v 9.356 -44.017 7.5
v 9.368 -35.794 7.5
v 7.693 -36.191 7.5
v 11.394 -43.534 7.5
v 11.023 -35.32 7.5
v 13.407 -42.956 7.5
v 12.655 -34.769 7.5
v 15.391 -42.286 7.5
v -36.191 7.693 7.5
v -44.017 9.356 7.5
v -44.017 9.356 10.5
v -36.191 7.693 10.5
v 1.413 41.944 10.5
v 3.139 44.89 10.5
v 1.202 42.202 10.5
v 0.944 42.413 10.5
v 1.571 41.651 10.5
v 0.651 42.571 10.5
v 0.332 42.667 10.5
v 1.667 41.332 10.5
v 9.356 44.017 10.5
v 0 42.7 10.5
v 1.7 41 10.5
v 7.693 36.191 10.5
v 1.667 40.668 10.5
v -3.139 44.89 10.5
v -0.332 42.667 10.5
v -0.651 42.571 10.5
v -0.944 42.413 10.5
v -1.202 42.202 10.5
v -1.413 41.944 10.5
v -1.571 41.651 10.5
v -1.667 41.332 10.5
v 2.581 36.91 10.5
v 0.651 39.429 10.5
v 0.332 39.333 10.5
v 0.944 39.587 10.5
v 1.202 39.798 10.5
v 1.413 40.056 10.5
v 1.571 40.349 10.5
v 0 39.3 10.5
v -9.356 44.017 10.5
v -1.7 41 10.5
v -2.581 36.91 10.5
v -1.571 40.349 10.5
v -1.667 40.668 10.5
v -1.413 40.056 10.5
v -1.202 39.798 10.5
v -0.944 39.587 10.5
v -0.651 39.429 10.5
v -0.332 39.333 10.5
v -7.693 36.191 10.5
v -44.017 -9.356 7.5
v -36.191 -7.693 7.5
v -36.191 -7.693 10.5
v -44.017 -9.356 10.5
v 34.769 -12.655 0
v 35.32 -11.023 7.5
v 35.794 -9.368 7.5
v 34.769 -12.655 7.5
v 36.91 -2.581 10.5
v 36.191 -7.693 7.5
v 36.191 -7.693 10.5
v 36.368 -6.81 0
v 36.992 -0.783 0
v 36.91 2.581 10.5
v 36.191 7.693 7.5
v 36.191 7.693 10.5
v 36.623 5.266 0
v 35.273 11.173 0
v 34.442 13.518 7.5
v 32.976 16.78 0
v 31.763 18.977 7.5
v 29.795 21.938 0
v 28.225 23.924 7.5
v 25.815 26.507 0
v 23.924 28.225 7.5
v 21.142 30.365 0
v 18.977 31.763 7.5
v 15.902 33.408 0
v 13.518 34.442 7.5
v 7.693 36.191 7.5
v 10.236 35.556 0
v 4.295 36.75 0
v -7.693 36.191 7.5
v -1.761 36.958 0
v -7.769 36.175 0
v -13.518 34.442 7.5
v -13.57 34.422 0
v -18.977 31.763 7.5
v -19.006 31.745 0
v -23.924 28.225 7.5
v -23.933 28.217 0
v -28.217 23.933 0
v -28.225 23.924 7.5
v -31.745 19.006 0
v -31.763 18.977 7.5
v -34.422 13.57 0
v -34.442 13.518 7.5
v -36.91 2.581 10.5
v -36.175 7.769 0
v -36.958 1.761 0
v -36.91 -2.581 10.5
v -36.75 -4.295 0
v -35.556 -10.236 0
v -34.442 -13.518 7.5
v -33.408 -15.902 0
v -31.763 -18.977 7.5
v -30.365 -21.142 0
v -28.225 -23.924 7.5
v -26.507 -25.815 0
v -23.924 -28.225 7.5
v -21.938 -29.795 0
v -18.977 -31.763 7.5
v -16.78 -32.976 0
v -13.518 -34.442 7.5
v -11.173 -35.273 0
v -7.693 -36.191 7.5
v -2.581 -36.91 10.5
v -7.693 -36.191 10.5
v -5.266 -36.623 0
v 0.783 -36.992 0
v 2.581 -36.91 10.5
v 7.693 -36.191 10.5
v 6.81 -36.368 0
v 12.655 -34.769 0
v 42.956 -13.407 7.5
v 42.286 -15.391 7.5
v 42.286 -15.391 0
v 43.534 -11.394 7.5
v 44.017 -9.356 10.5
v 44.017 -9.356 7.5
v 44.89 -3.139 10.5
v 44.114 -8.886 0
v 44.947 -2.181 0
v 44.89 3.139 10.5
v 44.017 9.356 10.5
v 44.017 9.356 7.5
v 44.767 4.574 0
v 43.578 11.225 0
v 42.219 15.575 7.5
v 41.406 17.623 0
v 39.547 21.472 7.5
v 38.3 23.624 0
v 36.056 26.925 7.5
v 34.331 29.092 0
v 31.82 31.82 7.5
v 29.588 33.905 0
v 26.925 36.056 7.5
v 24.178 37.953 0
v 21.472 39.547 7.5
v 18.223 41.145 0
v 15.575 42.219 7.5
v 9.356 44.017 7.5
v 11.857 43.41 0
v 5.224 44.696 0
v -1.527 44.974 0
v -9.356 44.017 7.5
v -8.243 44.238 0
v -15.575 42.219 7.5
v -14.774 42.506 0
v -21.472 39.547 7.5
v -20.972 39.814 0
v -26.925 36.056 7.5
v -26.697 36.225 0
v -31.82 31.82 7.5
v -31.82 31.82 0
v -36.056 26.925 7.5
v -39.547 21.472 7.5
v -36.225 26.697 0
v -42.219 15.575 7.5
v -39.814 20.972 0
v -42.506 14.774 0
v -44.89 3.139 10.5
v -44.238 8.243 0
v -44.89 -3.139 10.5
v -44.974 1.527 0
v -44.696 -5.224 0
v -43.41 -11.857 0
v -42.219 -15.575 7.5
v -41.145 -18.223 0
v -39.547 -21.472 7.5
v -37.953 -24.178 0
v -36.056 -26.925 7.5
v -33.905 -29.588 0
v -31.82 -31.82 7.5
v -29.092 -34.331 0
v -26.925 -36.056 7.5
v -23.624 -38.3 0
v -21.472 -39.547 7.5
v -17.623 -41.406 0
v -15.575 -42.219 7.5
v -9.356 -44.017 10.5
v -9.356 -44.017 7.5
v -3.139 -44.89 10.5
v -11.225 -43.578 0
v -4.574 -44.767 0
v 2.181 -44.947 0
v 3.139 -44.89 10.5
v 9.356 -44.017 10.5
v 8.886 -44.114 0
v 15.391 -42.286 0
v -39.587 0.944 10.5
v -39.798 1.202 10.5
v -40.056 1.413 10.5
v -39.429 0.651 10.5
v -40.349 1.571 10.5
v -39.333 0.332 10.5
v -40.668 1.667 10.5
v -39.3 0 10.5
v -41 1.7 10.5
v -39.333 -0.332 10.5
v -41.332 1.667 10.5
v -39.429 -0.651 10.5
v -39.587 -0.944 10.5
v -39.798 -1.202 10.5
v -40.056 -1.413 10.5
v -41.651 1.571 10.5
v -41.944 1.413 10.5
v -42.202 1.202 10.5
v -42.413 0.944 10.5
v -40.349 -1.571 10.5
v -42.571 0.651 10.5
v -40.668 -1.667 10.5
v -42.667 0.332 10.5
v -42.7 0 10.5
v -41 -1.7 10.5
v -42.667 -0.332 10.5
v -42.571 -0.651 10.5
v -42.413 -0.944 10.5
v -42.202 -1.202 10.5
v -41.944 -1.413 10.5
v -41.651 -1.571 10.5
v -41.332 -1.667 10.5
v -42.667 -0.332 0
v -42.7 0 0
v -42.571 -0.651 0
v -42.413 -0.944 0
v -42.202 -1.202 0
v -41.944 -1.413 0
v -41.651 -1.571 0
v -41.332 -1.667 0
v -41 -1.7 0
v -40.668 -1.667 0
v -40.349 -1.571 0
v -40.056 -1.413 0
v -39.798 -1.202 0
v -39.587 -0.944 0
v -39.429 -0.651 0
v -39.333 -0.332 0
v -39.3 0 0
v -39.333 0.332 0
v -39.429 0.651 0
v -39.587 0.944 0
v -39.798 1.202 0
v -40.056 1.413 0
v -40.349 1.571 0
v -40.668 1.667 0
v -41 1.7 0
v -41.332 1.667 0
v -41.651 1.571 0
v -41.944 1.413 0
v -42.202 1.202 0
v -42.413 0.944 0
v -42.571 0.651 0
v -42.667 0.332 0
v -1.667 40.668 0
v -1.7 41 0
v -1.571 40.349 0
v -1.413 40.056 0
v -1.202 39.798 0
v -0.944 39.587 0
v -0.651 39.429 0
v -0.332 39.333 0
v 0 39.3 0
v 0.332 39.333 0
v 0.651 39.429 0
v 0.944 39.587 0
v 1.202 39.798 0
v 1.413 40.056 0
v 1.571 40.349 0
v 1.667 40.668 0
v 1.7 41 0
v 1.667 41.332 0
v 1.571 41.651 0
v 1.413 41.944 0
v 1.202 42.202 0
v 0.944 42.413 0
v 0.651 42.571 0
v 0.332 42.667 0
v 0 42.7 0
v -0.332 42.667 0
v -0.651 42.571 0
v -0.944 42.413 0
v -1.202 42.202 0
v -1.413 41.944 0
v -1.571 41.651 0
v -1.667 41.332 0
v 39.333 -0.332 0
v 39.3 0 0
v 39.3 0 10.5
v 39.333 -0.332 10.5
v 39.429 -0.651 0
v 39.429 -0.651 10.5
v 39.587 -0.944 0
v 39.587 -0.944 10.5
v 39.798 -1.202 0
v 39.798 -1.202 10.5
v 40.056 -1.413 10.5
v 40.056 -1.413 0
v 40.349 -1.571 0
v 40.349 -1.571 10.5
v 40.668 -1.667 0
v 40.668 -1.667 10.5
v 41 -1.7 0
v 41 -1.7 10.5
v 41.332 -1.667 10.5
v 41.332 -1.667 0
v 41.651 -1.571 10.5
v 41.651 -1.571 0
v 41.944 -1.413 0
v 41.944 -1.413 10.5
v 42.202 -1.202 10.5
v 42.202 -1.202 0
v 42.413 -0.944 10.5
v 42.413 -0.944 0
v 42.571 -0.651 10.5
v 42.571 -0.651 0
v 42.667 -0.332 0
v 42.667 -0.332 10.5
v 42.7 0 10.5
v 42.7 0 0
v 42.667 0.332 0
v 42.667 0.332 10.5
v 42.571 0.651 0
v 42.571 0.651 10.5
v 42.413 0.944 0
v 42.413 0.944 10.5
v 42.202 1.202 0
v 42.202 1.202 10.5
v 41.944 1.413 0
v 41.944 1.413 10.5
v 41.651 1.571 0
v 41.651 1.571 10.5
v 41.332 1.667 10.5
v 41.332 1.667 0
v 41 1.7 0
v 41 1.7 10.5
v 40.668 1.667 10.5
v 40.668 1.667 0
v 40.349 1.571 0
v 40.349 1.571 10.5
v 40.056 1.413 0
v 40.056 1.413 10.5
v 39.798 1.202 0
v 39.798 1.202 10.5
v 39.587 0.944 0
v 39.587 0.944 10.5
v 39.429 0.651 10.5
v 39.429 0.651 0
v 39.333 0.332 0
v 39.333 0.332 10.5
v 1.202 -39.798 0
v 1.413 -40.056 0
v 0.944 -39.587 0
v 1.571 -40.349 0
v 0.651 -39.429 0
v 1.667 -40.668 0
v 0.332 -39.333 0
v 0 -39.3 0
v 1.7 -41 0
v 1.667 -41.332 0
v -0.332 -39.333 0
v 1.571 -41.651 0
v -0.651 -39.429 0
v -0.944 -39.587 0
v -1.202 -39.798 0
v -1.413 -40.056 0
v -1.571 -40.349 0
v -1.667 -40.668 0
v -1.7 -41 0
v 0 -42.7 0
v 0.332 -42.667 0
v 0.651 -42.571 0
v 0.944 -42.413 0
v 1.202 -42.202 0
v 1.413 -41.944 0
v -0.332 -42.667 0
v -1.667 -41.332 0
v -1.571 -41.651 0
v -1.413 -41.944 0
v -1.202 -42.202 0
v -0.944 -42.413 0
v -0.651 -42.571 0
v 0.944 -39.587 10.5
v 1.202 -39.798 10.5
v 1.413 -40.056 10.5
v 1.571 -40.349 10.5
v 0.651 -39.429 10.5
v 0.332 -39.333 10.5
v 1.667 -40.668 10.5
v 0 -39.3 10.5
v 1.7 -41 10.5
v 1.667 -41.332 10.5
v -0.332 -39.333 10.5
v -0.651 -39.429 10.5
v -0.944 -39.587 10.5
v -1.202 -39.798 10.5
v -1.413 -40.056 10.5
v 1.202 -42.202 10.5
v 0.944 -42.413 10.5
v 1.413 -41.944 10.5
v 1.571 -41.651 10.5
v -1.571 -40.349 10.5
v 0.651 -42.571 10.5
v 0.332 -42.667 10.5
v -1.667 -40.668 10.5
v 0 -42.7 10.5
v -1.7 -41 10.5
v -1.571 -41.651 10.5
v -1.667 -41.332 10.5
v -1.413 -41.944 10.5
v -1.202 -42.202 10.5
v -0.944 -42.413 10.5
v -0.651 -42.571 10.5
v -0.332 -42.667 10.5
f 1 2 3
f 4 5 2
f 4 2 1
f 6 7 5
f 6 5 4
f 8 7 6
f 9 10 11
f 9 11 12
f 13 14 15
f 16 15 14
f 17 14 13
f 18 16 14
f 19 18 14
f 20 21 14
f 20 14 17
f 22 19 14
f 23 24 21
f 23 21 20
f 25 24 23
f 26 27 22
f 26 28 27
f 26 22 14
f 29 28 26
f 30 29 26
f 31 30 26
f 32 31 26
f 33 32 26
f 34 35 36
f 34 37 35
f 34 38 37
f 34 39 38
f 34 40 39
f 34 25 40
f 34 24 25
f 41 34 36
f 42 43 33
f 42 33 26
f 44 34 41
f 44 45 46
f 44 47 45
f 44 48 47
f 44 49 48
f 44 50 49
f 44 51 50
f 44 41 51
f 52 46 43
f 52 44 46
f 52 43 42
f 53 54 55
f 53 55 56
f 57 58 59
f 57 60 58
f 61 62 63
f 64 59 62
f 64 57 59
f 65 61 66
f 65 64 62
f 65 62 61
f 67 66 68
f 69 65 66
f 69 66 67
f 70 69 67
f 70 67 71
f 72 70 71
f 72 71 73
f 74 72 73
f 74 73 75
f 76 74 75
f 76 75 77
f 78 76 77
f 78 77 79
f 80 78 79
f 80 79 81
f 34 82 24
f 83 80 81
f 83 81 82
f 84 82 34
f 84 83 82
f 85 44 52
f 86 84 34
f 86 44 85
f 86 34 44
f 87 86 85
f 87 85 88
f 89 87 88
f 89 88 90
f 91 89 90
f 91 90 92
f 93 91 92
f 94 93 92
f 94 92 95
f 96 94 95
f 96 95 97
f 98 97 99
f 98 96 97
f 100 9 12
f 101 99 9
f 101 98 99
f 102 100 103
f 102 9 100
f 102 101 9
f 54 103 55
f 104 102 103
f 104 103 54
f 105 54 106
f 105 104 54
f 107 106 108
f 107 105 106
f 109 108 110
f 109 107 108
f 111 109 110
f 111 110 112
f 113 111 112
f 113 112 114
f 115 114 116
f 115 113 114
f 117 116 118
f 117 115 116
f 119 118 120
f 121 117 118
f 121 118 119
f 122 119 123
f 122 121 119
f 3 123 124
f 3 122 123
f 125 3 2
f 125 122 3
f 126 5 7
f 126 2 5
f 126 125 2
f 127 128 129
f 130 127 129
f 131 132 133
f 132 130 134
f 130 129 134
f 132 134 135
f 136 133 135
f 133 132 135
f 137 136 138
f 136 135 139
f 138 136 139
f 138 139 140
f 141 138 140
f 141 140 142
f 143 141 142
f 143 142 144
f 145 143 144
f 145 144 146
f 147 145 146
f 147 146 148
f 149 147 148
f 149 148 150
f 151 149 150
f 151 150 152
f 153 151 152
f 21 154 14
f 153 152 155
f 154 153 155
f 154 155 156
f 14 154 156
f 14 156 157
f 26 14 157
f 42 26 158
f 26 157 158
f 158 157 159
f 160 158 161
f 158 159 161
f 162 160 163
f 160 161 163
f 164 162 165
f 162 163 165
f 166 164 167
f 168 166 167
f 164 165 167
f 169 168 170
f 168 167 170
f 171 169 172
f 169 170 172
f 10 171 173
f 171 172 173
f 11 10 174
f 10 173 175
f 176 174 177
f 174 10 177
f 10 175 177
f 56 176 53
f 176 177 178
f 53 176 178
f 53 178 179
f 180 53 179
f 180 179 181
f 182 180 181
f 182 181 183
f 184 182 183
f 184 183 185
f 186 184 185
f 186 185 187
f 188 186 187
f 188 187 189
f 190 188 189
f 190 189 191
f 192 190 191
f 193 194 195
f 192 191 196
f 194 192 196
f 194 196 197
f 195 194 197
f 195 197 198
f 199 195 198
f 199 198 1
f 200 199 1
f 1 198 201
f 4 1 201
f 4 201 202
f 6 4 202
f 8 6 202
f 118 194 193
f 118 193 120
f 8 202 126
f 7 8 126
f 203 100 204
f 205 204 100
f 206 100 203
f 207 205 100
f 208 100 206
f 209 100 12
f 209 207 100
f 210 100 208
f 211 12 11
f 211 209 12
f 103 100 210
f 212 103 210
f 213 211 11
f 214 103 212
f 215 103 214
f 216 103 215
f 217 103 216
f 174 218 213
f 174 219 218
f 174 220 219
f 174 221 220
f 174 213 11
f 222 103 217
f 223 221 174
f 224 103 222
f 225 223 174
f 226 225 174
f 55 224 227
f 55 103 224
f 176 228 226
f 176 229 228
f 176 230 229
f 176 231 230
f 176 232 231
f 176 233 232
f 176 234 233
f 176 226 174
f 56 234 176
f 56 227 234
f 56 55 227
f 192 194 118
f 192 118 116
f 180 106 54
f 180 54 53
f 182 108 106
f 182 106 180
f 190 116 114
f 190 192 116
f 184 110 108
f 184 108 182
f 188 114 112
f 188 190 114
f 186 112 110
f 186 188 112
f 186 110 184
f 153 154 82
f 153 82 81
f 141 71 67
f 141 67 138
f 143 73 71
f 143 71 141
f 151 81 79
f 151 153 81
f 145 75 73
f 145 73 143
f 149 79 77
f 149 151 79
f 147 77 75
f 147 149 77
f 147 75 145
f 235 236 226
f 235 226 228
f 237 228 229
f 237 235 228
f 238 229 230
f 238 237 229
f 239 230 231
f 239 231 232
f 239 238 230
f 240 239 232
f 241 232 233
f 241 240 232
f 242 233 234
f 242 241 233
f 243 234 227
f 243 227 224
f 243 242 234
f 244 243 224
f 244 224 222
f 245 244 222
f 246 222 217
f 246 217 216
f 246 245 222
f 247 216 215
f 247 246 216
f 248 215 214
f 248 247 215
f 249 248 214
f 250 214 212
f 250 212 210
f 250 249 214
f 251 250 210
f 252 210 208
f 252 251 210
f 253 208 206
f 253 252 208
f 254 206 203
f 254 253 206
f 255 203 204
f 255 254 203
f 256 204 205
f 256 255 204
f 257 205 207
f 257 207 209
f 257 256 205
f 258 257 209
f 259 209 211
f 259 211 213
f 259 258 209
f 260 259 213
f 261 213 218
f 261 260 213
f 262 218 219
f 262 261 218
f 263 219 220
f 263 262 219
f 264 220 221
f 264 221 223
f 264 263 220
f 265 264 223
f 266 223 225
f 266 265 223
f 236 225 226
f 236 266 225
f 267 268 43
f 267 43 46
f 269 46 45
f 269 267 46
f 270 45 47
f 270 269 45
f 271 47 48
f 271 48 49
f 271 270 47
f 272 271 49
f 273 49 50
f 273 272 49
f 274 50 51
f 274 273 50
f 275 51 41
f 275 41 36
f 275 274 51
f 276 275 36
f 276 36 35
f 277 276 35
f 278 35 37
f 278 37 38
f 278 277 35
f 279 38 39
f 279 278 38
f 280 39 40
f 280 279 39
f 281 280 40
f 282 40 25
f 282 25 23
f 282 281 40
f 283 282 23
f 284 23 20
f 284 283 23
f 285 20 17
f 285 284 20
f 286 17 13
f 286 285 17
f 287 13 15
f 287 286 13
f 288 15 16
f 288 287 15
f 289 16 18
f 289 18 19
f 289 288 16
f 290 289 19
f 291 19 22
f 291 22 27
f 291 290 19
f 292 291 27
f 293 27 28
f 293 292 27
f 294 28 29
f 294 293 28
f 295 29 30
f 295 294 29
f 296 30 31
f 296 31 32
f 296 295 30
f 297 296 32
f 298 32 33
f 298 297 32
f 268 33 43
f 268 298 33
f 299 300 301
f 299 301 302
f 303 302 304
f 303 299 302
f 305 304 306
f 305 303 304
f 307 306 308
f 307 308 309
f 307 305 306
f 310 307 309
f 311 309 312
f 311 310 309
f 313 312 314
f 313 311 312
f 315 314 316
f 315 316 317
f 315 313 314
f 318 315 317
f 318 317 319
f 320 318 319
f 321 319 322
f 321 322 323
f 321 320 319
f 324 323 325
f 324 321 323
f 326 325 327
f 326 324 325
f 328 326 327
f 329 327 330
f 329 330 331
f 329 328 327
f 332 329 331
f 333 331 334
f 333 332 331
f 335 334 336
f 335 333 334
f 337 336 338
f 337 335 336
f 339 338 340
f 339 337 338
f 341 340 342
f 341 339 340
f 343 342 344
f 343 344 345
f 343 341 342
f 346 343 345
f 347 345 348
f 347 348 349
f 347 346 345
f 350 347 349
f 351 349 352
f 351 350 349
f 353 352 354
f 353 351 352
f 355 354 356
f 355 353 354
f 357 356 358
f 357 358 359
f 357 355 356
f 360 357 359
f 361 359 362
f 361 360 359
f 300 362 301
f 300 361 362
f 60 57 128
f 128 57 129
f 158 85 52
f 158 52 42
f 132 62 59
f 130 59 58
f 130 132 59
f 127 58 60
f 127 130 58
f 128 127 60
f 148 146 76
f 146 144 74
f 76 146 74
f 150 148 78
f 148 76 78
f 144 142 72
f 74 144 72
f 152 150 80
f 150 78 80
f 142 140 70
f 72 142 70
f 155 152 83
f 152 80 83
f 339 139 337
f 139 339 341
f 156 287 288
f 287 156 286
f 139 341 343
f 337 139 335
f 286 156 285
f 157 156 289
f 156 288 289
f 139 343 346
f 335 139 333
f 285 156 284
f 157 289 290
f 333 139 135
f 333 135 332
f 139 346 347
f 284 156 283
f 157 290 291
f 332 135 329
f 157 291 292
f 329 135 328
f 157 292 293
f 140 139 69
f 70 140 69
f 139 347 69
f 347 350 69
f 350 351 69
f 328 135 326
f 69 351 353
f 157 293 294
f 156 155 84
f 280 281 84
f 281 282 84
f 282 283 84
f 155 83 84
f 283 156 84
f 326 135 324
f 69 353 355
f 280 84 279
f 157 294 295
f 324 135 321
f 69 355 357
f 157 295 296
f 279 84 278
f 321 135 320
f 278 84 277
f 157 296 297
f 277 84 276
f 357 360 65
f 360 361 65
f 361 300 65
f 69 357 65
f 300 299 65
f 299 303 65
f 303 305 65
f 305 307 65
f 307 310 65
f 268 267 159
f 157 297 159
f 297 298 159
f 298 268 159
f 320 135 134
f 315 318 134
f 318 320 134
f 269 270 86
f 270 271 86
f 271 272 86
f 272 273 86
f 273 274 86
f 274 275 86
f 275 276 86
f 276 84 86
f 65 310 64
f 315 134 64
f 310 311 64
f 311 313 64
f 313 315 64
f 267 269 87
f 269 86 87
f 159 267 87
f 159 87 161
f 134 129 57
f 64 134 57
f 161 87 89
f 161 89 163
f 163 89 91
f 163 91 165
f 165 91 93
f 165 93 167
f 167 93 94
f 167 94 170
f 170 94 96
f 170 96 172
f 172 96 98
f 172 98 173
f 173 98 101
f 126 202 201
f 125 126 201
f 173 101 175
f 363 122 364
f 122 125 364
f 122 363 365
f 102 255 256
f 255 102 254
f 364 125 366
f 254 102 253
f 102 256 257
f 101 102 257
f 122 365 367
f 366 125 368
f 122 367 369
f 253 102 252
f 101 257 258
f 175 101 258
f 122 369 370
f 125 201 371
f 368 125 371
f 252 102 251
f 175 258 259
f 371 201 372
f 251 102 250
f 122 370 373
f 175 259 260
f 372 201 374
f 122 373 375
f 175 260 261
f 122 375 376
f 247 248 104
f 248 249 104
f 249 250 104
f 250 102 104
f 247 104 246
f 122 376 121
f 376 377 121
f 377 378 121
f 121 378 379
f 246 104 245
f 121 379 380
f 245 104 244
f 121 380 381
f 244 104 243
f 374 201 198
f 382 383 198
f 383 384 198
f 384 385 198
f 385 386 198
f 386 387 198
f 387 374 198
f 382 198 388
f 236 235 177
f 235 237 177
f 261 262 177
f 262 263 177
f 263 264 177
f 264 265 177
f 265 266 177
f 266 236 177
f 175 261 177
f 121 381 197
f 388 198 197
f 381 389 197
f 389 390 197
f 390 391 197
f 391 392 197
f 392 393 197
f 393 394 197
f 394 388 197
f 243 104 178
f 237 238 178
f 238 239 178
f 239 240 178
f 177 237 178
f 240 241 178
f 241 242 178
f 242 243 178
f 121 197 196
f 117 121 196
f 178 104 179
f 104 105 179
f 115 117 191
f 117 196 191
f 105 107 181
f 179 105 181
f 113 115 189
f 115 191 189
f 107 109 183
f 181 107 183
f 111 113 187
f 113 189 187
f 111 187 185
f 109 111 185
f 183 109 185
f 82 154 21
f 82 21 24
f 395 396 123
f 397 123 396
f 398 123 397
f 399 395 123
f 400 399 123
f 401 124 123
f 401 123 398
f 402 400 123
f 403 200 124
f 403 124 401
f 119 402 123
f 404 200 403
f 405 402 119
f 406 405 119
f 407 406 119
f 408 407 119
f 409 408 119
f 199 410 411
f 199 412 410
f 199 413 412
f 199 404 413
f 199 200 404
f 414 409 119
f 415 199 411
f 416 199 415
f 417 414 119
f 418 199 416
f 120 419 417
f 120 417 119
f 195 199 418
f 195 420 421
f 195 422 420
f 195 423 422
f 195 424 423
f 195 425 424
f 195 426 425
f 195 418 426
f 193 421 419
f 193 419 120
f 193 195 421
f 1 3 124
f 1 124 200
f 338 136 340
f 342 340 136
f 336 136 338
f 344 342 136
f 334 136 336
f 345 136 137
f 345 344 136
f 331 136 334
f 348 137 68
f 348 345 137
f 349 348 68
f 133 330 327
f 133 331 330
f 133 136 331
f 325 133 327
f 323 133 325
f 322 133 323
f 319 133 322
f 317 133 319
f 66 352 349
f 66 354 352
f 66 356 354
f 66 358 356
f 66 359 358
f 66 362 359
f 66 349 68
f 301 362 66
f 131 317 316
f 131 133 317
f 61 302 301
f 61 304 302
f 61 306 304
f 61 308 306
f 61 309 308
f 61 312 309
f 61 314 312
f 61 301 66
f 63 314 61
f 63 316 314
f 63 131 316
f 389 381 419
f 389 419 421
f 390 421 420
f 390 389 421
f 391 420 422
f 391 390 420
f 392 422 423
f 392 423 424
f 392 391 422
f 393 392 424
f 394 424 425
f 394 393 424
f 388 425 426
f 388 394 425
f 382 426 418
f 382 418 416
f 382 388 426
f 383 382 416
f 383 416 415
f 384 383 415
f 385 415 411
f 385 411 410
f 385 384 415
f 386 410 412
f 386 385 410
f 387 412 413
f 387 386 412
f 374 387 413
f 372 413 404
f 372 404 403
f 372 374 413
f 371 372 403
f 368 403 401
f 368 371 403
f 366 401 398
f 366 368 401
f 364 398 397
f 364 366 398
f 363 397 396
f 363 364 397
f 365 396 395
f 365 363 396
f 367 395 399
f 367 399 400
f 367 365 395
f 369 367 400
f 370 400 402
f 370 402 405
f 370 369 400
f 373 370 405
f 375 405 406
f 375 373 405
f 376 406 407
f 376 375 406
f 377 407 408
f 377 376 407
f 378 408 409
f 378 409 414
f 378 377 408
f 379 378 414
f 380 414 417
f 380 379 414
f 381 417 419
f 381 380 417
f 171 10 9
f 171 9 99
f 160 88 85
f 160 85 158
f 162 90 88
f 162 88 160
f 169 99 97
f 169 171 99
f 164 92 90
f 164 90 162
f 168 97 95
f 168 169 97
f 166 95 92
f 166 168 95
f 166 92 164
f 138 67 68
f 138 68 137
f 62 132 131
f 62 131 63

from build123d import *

# Parameters (mm, degrees)
SKETCH_1_R               = 45
SKETCH_1_R_2             = 37
SKETCH_1_R_3             = 1.7
EXTRUDE_1_DEPTH          = 10.5
CUT_EXTRUDE_START        = -3
CUT_EXTRUDE_1_DEPTH      = 3
PATTERN_CIRCULAR_1_COUNT = 4
CUT_EXTRUDE_START_2      = -13
CUT_EXTRUDE_2_DEPTH      = 13


with BuildPart() as part:
    # 草图1 → 凸台-拉伸1 (new body)
    with BuildSketch(Plane.XY):
        with Locations(Location((0, 0, 0), (0, 0, 180))):
            Circle(SKETCH_1_R)
        with Locations(Location((0, 0, 0), (0, 0, 180))):
            Circle(SKETCH_1_R_2, mode=Mode.SUBTRACT)
        with Locations(Location((41, 0, 0), (0, 0, 180))):
            Circle(SKETCH_1_R_3, mode=Mode.SUBTRACT)
        with Locations(Location((0, -41, 0), (0, 0, 180))):
            Circle(SKETCH_1_R_3, mode=Mode.SUBTRACT)
        with Locations(Location((-41, 0, 0), (0, 0, 180))):
            Circle(SKETCH_1_R_3, mode=Mode.SUBTRACT)
        with Locations(Location((0, 41, 0), (0, 0, 180))):
            Circle(SKETCH_1_R_3, mode=Mode.SUBTRACT)
    extrude(amount=EXTRUDE_1_DEPTH)

    # 草图2 → 切除-拉伸1 (cut)
    with BuildSketch(Plane.XY.offset(10.5).offset(CUT_EXTRUDE_START)):
        with BuildLine():
            Line((9.356026087, 44.016642033), (7.69273256, 36.191461227))
            ThreePointArc((7.69273256, 36.191461227), (26.162950904, 26.162950904), (36.191461227, 7.69273256))
            Line((36.191461227, 7.69273256), (44.016642033, 9.356026087))
            ThreePointArc((44.016642033, 9.356026087), (31.819805153, 31.819805153), (9.356026087, 44.016642033))
        make_face()
    cut_extrude_1 = extrude(amount=CUT_EXTRUDE_1_DEPTH, mode=Mode.SUBTRACT)

    # 阵列(圆周)1: 切除-拉伸1 ×4 about axis
    pattern_circular_1_axis = Axis((0, 0, 10.5), (0, 0, -1))
    for i in range(1, PATTERN_CIRCULAR_1_COUNT):
        add(cut_extrude_1.rotate(pattern_circular_1_axis, i * 360 / PATTERN_CIRCULAR_1_COUNT), mode=Mode.SUBTRACT)

    # 草图3 → 切除-拉伸2 (cut)
    with BuildSketch(Plane.XY.offset(7.5).offset(CUT_EXTRUDE_START_2)):
        with BuildLine():
            Line((34.768626969, -12.654745303), (42.286167935, -15.39090645))
            ThreePointArc((42.286167935, -15.39090645), (31.819805153, -31.819805153), (15.39090645, -42.286167935))
            Line((15.39090645, -42.286167935), (12.654745303, -34.768626969))
            ThreePointArc((12.654745303, -34.768626969), (26.162950904, -26.162950904), (34.768626969, -12.654745303))
        make_face()
    extrude(amount=CUT_EXTRUDE_2_DEPTH, mode=Mode.SUBTRACT)


solid = part.part
